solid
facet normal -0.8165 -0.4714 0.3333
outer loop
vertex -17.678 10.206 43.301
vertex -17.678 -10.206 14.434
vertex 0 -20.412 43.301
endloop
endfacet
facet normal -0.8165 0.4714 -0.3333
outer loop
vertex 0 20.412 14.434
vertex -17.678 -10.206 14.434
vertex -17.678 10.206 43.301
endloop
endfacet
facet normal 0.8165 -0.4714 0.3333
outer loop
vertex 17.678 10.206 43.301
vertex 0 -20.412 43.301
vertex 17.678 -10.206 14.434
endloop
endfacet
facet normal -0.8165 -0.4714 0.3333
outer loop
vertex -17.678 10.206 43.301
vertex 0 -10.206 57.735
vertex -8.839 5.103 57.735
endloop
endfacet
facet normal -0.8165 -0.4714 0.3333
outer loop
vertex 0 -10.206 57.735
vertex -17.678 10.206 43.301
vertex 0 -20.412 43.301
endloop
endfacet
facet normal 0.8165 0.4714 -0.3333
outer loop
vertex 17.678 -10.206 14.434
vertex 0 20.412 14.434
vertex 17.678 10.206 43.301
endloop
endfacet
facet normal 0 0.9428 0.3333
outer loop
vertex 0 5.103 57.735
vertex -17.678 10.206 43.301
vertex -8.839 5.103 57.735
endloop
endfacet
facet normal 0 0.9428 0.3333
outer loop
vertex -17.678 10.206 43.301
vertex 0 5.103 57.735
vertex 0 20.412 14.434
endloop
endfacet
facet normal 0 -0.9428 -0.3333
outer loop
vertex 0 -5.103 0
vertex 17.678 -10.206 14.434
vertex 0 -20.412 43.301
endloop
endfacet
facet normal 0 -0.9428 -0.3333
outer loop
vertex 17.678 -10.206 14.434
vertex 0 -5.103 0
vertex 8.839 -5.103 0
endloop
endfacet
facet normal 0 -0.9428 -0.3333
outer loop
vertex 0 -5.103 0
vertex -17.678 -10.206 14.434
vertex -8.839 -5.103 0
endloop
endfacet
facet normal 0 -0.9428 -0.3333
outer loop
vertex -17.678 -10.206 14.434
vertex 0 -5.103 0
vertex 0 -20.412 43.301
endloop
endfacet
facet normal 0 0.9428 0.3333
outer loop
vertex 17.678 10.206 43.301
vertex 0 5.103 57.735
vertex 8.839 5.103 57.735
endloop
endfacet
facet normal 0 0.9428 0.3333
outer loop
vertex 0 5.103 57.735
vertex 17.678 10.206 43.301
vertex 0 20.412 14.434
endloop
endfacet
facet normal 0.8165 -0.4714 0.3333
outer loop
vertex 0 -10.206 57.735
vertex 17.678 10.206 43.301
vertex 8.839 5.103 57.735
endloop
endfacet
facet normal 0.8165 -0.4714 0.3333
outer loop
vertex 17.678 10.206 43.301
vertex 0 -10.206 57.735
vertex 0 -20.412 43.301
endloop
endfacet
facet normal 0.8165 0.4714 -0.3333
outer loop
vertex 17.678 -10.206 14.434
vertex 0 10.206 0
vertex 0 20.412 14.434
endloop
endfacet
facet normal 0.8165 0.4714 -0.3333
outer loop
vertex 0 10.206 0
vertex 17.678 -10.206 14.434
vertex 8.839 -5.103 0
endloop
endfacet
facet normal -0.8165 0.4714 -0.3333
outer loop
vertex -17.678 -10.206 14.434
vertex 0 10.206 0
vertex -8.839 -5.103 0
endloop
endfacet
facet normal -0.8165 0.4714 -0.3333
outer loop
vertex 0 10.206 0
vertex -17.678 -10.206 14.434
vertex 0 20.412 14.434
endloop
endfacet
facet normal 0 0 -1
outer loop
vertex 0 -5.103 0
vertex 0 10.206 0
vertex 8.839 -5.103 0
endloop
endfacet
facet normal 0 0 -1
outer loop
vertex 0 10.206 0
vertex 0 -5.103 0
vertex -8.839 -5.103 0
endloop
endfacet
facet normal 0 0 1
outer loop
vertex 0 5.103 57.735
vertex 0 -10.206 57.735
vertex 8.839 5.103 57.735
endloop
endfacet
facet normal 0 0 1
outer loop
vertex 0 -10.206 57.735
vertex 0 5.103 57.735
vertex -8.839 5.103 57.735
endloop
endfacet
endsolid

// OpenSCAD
//////////////////////////////////////////////////////////////////////////////////////////
//  
//  'Dürer's Solid (60°)' by Chris Molloy (http://chrismolloy.com/durer)
//  
//  Released under Creative Commons - Attribution - Share Alike licence
//  
//  For more information see:
//  https://en.wikipedia.org/wiki/Melencolia_I
//  https://en.wikipedia.org/wiki/Truncated_triangular_trapezohedron#D.C3.BCrer.27s_solid
//  http://mathworld.wolfram.com/DuerersSolid.html
//  
//////////////////////////////////////////////////////////////////////////////////////////

// Length of edge of cube base (resulting polyhedron will be ≈2.3 times this high)
scale_base = 25; // mm

/* Hidden */
zz = 1 / sqrt(3); // ≈ 0.57735
theta = acos(zz); // ≈ 54.73561°

stretch_60 = 2;
unit_height_60 = (sqrt(3) - zz) * stretch_60; // ≈ 2.30940
drop_60 = ((sqrt(3) * stretch_60) - unit_height_60) / 2; // = zz

module unit_cube() {
  rotate([0, 0, -15]) {
    rotate(a = theta, v = [1, -1, 0]) {
      cube([scale_base, scale_base, scale_base]);
    }
  }
}

module durers_solid(drop, stretch, unit_height) {
  difference() {
    translate([0, 0, -drop * scale_base]) {
      scale([1, 1, stretch]) {
        unit_cube();
      }
    }
    translate([0, 0, -scale_base / 2]) {
      cube([scale_base, scale_base, scale_base], center = true);
    }
    translate([0, 0, (unit_height * scale_base) + (scale_base / 2)]) {
      cube([scale_base, scale_base, scale_base], center = true);
    }
  }
}

durers_solid(drop_60, stretch_60, unit_height_60);
